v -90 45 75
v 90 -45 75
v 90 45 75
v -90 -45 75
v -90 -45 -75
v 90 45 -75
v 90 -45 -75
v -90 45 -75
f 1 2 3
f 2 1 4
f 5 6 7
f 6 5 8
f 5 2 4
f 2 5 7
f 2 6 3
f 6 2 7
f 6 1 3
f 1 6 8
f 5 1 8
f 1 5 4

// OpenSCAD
//Design an Object: Outlet Phone Holder
//By jessicad2020
//v.0.1, 4 Jan 2019

//parameters -----------------------------------------------
chargeL = 25.7; //length of an Apple charger block
chargeW = 26.26; //width of an Apple charger block
chargeH = 44.28; //height of an Apple charger block
phoneL = 150; 
phoneW = 75;
phoneH = 10;

//render ---------------------------------------------------
//phone();
triangle();
//modules --------------------------------------------------
module triangle() {
    cube([phoneL*1.2, phoneW*1.2, phoneL], center=true);
}

module phone() {
    cube([phoneL, phoneW, phoneH], center=true);
}
